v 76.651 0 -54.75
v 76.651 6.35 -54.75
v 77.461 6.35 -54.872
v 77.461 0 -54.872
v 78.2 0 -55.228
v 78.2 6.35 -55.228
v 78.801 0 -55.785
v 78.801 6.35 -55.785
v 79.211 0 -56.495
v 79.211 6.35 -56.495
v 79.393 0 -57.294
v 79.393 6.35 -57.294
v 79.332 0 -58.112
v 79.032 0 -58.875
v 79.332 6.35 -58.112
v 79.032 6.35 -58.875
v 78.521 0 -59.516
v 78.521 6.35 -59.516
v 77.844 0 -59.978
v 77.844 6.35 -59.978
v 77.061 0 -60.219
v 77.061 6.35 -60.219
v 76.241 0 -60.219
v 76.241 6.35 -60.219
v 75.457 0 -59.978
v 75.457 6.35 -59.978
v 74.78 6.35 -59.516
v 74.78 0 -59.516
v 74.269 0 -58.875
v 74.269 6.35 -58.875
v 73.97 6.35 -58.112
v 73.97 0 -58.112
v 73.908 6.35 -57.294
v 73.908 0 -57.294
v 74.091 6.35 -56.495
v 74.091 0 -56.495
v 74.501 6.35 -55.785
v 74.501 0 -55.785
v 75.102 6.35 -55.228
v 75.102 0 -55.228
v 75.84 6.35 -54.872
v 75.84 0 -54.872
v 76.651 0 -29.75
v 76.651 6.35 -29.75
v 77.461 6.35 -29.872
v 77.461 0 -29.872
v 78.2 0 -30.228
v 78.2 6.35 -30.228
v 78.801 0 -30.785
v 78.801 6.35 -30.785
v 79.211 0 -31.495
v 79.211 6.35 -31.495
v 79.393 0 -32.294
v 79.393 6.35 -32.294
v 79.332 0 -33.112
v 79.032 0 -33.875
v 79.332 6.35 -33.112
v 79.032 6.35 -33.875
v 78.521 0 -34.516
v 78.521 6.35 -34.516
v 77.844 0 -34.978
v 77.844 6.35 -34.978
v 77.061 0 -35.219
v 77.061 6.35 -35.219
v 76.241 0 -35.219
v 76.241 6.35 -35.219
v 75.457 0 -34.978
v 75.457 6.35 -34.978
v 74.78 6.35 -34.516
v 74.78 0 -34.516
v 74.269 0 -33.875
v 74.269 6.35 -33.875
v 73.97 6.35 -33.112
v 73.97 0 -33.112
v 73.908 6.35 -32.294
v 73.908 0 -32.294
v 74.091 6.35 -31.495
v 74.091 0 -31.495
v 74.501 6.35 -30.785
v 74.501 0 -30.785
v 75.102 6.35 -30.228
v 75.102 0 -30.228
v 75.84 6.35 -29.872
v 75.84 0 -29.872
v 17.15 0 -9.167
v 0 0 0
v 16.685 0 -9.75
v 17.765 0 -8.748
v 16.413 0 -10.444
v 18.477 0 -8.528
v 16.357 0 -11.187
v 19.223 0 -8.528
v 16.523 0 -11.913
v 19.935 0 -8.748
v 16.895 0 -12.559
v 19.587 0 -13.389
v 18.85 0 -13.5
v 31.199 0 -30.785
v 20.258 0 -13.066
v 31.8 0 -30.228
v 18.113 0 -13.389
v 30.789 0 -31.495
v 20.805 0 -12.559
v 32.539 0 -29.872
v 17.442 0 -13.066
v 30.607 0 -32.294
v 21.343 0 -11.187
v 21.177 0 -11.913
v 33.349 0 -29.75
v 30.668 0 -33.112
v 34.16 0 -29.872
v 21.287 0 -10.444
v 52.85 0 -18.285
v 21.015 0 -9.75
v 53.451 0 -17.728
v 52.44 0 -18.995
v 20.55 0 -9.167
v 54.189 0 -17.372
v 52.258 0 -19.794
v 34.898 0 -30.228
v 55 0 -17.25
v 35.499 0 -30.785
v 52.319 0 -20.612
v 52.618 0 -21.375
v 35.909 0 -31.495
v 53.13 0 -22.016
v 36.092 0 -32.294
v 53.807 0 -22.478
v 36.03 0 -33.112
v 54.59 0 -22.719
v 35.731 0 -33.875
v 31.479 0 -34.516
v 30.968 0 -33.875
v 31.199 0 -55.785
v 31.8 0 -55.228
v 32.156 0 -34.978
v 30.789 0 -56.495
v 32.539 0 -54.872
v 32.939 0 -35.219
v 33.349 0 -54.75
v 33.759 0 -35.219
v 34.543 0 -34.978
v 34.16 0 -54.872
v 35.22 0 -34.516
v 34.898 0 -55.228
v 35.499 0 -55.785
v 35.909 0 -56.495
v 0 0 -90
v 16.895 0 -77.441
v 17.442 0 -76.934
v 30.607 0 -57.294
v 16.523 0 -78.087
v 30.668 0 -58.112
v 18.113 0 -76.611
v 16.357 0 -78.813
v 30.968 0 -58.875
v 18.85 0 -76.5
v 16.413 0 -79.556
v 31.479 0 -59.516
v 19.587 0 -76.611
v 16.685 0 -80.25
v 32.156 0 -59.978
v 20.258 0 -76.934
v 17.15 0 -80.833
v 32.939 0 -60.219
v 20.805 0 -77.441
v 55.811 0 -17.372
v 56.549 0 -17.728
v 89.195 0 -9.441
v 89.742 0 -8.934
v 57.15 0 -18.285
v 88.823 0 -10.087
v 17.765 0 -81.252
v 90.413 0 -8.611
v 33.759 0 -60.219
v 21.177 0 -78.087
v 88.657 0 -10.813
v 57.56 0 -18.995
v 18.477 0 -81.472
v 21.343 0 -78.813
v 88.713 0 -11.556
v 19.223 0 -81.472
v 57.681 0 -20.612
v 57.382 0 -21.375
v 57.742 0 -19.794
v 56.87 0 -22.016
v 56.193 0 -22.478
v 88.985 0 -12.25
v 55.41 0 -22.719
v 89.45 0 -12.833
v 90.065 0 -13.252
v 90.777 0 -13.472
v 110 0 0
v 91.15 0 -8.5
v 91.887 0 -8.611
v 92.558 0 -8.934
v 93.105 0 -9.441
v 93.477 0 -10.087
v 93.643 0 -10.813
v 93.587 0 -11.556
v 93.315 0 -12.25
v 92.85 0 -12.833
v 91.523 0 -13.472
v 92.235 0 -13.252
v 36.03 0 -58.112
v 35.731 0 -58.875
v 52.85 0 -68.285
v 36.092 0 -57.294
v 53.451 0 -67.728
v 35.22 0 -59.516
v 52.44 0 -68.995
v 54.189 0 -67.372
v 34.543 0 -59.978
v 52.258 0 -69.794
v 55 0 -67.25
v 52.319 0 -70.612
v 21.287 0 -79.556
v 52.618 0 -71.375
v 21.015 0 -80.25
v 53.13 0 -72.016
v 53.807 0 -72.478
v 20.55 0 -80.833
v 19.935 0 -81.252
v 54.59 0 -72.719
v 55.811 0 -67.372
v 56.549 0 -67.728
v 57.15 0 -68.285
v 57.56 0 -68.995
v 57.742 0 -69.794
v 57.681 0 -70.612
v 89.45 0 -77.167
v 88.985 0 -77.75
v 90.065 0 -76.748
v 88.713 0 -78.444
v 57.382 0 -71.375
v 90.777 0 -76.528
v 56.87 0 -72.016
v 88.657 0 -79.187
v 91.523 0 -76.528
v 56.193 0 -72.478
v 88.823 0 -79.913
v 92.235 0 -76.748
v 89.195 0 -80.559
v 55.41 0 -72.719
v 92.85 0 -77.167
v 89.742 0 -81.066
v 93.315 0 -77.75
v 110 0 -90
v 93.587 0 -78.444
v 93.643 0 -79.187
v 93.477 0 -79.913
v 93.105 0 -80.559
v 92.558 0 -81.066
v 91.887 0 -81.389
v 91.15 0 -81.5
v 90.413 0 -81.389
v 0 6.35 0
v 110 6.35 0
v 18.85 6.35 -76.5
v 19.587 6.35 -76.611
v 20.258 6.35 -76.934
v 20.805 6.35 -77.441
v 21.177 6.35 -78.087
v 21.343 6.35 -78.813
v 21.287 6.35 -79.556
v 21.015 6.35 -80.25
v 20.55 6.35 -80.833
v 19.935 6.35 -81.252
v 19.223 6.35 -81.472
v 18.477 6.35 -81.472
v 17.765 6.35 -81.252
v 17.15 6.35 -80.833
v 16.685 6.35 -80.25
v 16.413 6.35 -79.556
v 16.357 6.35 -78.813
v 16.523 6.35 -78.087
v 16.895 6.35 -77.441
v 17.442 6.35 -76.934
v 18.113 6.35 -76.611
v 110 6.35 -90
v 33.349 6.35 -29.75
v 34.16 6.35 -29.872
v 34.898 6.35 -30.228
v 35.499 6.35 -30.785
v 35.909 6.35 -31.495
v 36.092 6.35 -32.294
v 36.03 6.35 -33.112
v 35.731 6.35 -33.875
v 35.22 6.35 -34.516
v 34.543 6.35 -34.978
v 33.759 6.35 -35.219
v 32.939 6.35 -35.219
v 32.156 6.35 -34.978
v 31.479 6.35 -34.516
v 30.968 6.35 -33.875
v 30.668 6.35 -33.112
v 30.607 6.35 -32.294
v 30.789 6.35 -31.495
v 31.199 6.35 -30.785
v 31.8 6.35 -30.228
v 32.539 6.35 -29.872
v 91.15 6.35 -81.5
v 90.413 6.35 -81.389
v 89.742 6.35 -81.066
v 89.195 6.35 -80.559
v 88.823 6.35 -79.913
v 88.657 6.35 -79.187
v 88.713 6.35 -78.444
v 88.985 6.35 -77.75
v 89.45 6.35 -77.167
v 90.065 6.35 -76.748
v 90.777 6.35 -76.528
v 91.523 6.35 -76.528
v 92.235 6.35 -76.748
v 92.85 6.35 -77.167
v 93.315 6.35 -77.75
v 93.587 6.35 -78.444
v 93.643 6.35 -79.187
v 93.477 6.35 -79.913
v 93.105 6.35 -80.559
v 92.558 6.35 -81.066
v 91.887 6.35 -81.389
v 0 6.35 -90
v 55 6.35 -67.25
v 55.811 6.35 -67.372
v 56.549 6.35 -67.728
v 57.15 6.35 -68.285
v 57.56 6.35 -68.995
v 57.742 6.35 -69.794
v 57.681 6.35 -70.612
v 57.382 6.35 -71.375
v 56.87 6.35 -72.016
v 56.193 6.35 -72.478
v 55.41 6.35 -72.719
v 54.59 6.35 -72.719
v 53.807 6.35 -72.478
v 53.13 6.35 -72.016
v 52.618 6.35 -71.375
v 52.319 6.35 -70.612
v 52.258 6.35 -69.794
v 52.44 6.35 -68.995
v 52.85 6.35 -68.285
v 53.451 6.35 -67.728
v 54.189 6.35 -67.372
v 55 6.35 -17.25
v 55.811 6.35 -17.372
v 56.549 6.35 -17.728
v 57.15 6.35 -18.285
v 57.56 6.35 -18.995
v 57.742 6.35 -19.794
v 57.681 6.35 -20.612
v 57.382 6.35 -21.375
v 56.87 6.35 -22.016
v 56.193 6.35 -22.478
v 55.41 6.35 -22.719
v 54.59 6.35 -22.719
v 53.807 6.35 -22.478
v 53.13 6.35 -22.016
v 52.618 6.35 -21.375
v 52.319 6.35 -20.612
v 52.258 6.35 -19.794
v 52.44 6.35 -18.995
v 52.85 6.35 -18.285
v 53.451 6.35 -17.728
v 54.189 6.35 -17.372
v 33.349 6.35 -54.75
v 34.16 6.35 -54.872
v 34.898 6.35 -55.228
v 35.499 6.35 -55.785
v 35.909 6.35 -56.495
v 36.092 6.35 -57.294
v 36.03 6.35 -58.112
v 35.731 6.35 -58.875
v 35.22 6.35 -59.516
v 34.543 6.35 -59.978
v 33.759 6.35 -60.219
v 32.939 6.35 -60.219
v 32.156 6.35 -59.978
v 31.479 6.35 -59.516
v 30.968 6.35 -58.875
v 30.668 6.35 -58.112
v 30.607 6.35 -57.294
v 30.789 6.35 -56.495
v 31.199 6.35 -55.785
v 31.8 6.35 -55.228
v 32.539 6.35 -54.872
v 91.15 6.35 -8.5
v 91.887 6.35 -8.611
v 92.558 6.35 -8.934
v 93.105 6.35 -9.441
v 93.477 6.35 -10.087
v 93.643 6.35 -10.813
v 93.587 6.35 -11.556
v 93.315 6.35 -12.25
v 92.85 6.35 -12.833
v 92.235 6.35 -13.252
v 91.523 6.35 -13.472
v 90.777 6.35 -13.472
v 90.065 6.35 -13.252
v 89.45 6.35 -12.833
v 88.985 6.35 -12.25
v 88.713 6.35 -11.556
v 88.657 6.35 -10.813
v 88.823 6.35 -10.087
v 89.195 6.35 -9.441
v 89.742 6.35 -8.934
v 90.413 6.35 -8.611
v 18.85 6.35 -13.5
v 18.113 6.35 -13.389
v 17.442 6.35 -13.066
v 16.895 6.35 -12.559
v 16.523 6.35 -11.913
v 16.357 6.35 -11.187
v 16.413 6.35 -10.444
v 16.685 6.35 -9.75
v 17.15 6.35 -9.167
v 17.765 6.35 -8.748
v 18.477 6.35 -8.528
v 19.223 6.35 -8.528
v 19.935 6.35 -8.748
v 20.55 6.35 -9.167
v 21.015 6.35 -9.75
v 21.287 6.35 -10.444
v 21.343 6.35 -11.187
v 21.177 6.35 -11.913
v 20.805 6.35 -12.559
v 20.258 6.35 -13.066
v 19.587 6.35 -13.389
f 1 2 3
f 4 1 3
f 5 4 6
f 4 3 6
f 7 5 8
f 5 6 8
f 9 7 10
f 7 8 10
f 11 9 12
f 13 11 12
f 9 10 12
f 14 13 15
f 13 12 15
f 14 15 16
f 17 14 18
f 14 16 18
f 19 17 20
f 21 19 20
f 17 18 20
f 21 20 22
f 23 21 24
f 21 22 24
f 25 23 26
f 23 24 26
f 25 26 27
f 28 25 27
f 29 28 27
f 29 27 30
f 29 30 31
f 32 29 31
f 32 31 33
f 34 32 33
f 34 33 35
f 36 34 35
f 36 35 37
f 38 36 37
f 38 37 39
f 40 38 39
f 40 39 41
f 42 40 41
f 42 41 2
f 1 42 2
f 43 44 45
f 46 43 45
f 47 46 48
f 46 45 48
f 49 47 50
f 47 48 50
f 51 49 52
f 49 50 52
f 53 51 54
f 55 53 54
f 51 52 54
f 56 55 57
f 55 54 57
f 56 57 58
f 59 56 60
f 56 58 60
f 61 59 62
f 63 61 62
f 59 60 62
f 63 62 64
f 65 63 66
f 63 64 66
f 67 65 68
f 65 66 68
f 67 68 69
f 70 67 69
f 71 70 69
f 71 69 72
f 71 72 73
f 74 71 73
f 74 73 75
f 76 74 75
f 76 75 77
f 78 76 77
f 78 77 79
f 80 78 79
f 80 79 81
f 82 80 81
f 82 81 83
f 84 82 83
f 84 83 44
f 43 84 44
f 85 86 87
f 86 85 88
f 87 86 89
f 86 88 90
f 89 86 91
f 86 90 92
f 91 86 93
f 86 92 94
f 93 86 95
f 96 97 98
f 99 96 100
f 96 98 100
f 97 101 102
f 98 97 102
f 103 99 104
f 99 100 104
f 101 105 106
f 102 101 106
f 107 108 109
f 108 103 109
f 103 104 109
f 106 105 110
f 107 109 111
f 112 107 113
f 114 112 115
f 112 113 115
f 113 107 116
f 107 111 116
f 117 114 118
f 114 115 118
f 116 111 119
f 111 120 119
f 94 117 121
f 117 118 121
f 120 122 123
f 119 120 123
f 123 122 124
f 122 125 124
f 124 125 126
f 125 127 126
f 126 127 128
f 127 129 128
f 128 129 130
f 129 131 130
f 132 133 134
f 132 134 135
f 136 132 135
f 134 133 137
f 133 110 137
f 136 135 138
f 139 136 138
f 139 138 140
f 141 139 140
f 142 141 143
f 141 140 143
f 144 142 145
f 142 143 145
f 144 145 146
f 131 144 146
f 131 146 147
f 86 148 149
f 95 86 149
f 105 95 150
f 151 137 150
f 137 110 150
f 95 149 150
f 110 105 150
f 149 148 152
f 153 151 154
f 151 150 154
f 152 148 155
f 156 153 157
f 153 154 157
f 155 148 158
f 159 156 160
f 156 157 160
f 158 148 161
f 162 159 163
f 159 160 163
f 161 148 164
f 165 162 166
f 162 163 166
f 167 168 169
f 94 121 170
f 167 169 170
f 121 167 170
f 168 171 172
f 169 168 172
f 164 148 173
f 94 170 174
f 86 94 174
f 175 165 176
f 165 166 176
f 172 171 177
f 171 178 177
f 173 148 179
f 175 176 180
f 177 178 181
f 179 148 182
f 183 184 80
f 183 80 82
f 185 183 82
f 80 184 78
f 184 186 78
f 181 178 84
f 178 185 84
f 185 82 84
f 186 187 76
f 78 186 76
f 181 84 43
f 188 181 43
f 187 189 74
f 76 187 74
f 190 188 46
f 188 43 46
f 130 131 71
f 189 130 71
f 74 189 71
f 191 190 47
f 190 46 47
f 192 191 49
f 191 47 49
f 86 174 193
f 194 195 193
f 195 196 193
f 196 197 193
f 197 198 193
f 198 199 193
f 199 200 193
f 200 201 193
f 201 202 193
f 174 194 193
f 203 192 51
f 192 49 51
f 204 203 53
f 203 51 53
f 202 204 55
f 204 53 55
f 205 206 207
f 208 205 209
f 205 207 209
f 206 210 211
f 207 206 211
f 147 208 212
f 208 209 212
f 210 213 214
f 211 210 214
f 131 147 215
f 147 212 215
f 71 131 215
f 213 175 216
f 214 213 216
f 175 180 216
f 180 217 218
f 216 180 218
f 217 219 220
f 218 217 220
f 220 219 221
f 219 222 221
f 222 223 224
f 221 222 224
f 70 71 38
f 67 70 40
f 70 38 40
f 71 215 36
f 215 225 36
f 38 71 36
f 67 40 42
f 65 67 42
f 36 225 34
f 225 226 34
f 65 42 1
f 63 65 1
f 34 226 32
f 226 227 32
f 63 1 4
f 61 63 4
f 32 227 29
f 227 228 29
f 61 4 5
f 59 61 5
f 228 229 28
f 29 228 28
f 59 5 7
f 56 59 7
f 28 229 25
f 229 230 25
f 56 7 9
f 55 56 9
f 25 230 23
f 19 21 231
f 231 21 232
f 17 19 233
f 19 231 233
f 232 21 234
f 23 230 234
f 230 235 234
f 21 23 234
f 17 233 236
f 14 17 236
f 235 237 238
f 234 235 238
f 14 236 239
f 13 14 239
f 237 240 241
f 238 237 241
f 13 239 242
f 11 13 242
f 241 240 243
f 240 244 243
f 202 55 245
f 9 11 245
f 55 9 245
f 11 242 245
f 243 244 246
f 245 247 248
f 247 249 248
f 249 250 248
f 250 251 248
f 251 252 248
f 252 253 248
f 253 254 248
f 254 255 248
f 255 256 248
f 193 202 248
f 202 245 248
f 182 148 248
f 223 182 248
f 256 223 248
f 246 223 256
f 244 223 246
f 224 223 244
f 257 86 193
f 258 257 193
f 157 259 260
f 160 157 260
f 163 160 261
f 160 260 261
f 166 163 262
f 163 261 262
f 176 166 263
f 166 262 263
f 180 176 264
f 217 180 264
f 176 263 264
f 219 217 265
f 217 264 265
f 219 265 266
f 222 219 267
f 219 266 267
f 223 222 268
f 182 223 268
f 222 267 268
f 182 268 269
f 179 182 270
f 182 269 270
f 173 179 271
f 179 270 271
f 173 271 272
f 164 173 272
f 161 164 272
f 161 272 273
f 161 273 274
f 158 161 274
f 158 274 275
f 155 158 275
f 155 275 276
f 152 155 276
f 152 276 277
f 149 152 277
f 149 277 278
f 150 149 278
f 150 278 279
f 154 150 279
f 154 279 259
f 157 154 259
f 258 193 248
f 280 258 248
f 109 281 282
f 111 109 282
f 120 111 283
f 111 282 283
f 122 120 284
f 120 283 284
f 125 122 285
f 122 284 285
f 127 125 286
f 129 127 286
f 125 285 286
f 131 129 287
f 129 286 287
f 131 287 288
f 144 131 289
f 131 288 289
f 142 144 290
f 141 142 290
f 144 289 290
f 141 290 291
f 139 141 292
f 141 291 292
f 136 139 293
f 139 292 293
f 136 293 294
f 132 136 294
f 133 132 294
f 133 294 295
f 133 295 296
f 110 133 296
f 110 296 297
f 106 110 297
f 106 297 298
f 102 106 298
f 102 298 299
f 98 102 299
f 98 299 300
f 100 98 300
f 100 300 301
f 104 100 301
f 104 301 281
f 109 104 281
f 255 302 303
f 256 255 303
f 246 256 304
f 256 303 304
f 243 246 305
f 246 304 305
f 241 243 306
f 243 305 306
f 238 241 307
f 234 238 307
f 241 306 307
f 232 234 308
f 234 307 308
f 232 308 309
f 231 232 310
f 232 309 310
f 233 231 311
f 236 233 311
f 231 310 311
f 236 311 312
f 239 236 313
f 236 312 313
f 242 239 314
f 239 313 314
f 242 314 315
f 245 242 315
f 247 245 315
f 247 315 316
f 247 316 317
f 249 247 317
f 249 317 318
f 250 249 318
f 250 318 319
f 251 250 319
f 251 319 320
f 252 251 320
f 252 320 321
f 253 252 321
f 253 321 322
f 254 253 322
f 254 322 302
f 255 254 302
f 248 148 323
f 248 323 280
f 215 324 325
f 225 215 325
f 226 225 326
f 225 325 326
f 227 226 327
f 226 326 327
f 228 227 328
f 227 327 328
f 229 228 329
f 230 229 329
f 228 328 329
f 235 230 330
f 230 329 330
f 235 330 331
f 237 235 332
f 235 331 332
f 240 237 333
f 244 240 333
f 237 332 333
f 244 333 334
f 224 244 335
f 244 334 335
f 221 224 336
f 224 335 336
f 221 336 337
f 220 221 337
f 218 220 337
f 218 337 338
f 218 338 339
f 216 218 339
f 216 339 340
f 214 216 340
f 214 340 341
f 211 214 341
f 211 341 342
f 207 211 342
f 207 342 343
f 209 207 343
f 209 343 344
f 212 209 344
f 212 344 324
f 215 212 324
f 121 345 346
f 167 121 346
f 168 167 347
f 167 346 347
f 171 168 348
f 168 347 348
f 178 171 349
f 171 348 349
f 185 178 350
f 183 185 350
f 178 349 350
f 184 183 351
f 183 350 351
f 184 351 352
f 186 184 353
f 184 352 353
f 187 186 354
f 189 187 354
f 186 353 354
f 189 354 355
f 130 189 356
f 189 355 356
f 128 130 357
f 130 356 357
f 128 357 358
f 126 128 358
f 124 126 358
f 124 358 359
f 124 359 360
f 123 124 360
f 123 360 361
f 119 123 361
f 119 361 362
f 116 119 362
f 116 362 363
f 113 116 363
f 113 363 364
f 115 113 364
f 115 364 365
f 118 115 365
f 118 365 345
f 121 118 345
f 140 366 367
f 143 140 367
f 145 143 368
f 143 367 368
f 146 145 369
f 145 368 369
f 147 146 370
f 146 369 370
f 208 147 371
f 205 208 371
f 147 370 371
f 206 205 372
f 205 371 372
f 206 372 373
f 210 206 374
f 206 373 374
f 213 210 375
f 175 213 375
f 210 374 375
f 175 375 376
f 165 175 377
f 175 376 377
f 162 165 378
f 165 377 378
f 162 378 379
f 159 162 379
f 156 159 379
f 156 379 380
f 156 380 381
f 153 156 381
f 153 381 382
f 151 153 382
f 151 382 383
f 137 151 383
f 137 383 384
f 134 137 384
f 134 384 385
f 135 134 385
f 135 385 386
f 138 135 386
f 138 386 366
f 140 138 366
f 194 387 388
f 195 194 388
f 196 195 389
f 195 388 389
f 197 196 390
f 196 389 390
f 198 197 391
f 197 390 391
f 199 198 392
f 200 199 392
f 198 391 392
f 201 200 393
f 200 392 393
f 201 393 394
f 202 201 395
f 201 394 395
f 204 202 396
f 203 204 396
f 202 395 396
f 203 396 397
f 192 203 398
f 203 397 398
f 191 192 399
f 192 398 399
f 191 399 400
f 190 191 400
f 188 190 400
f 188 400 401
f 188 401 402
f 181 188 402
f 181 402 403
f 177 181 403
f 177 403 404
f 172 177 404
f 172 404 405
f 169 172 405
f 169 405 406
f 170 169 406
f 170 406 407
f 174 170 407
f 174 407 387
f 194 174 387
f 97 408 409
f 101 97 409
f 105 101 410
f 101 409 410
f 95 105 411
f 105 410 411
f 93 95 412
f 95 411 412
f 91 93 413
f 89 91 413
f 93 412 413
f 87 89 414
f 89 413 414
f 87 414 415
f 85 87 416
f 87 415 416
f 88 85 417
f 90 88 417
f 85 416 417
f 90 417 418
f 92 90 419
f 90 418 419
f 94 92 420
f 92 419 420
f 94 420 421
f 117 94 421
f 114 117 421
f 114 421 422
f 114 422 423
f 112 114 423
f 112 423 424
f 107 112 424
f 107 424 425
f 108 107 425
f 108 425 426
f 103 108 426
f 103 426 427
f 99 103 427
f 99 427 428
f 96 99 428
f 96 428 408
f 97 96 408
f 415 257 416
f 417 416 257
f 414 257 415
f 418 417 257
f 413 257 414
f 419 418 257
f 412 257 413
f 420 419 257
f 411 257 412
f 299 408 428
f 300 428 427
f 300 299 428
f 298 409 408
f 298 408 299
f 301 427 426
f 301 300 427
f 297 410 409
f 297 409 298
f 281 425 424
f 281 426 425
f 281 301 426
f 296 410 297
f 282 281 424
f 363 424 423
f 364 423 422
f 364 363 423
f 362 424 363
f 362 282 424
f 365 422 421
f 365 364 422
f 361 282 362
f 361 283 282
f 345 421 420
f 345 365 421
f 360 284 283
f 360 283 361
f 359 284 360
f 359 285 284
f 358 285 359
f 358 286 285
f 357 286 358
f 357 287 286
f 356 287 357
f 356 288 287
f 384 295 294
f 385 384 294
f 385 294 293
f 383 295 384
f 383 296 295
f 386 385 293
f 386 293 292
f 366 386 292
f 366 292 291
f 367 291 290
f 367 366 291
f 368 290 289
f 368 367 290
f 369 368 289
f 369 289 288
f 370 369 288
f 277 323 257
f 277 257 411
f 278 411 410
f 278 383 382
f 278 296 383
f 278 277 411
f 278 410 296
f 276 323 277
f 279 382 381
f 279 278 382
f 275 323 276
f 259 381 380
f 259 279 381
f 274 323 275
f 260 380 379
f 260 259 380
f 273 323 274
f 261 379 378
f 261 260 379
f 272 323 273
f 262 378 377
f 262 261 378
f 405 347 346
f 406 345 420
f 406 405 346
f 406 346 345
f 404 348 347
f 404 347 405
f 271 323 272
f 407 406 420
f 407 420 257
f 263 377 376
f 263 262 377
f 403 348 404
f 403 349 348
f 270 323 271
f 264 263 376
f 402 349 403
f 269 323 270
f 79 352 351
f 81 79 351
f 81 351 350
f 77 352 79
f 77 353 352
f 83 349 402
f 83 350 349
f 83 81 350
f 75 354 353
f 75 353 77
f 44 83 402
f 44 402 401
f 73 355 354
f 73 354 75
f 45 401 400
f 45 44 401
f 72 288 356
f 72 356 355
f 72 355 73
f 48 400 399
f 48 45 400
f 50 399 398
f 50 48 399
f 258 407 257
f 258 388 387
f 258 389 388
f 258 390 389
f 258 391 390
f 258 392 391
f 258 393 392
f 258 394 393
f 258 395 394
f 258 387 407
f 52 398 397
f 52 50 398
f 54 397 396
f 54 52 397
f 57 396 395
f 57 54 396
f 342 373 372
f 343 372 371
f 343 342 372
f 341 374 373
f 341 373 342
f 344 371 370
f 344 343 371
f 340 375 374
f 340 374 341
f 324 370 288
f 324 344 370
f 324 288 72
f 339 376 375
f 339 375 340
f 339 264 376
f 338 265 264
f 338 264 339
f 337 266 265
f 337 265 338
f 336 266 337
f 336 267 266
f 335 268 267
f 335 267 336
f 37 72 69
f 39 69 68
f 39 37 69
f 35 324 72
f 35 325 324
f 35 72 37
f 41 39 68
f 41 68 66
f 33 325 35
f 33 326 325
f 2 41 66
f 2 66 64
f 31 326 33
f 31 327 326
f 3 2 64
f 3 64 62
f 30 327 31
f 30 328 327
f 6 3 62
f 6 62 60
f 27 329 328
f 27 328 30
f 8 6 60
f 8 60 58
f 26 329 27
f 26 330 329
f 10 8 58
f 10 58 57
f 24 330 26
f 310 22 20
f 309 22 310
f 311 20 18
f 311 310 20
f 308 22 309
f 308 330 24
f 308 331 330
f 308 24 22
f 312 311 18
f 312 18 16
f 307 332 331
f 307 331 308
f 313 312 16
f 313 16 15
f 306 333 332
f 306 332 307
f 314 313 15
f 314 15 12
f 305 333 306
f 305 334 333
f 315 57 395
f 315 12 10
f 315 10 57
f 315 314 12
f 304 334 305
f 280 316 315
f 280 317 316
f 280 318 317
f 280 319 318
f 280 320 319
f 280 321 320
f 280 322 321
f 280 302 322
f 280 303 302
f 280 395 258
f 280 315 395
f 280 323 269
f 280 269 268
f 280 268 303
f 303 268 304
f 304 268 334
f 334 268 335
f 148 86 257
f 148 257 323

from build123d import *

# Parameters (mm, degrees)
SKETCH2_W            = 110
SKETCH2_H            = 90
BOSS_EXTRUDE1_DEPTH  = 6.35
SKETCH3_R            = 2.5
MOUNTING_HOLES_DEPTH = 143.268487375
SKETCH4_R            = 2.75
CUT_EXTRUDE1_DEPTH   = 143.268487375


with BuildPart() as part:
    # Sketch2 → Boss-Extrude1 (new body)
    with BuildSketch(Plane(origin=(0, 0, 0), x_dir=(1, 0, 0), z_dir=(0, 1, 0))):
        with Locations((55, 45)):
            Rectangle(SKETCH2_W, SKETCH2_H)
    extrude(amount=BOSS_EXTRUDE1_DEPTH)

    # Sketch3 → Mounting Holes (cut, through all)
    with BuildSketch(Plane(origin=(0, 6.35, 0), x_dir=(1, 0, 0), z_dir=(0, 1, 0))):
        with Locations(Location((18.85, 79, 0), (0, 0, 270))):
            Circle(SKETCH3_R)
        with Locations(Location((18.85, 11, 0), (0, 0, 90))):
            Circle(SKETCH3_R)
        with Locations(Location((91.15, 11, 0), (0, 0, 270))):
            Circle(SKETCH3_R)
        with Locations(Location((91.15, 79, 0), (0, 0, 90))):
            Circle(SKETCH3_R)
    extrude(amount=-MOUNTING_HOLES_DEPTH, mode=Mode.SUBTRACT)

    # Sketch4 → Cut-Extrude1 (cut, through all)
    with BuildSketch(Plane(origin=(0, 6.35, 0), x_dir=(1, 0, 0), z_dir=(0, 1, 0))):
        with Locations(Location((55, 70, 0), (0, 0, 270))):
            Circle(SKETCH4_R)
        with Locations(Location((76.650635095, 57.5, 0), (0, 0, 270))):
            Circle(SKETCH4_R)
        with Locations(Location((76.650635095, 32.5, 0), (0, 0, 270))):
            Circle(SKETCH4_R)
        with Locations(Location((55, 20, 0), (0, 0, 270))):
            Circle(SKETCH4_R)
        with Locations(Location((33.349364905, 32.5, 0), (0, 0, 270))):
            Circle(SKETCH4_R)
        with Locations(Location((33.349364905, 57.5, 0), (0, 0, 270))):
            Circle(SKETCH4_R)
    extrude(amount=-CUT_EXTRUDE1_DEPTH, mode=Mode.SUBTRACT)


solid = part.part
